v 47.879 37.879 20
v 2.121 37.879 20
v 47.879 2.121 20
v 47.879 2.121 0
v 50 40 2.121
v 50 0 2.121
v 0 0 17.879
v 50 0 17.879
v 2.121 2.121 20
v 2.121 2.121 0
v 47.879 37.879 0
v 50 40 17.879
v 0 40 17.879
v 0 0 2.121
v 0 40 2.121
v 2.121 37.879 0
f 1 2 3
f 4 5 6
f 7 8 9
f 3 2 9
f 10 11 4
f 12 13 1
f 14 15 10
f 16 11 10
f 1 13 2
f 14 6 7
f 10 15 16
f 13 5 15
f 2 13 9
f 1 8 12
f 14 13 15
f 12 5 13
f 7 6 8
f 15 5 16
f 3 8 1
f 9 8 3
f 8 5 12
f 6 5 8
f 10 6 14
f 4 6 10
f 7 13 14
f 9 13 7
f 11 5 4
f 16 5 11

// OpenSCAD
$fn=96;
radius=3;
leg=radius/sqrt(2); hull(){translate([leg,leg,0]) cube([50-2*leg,40-2*leg,20]); translate([0,0,leg]) cube([50,40,20-2*leg]);}
